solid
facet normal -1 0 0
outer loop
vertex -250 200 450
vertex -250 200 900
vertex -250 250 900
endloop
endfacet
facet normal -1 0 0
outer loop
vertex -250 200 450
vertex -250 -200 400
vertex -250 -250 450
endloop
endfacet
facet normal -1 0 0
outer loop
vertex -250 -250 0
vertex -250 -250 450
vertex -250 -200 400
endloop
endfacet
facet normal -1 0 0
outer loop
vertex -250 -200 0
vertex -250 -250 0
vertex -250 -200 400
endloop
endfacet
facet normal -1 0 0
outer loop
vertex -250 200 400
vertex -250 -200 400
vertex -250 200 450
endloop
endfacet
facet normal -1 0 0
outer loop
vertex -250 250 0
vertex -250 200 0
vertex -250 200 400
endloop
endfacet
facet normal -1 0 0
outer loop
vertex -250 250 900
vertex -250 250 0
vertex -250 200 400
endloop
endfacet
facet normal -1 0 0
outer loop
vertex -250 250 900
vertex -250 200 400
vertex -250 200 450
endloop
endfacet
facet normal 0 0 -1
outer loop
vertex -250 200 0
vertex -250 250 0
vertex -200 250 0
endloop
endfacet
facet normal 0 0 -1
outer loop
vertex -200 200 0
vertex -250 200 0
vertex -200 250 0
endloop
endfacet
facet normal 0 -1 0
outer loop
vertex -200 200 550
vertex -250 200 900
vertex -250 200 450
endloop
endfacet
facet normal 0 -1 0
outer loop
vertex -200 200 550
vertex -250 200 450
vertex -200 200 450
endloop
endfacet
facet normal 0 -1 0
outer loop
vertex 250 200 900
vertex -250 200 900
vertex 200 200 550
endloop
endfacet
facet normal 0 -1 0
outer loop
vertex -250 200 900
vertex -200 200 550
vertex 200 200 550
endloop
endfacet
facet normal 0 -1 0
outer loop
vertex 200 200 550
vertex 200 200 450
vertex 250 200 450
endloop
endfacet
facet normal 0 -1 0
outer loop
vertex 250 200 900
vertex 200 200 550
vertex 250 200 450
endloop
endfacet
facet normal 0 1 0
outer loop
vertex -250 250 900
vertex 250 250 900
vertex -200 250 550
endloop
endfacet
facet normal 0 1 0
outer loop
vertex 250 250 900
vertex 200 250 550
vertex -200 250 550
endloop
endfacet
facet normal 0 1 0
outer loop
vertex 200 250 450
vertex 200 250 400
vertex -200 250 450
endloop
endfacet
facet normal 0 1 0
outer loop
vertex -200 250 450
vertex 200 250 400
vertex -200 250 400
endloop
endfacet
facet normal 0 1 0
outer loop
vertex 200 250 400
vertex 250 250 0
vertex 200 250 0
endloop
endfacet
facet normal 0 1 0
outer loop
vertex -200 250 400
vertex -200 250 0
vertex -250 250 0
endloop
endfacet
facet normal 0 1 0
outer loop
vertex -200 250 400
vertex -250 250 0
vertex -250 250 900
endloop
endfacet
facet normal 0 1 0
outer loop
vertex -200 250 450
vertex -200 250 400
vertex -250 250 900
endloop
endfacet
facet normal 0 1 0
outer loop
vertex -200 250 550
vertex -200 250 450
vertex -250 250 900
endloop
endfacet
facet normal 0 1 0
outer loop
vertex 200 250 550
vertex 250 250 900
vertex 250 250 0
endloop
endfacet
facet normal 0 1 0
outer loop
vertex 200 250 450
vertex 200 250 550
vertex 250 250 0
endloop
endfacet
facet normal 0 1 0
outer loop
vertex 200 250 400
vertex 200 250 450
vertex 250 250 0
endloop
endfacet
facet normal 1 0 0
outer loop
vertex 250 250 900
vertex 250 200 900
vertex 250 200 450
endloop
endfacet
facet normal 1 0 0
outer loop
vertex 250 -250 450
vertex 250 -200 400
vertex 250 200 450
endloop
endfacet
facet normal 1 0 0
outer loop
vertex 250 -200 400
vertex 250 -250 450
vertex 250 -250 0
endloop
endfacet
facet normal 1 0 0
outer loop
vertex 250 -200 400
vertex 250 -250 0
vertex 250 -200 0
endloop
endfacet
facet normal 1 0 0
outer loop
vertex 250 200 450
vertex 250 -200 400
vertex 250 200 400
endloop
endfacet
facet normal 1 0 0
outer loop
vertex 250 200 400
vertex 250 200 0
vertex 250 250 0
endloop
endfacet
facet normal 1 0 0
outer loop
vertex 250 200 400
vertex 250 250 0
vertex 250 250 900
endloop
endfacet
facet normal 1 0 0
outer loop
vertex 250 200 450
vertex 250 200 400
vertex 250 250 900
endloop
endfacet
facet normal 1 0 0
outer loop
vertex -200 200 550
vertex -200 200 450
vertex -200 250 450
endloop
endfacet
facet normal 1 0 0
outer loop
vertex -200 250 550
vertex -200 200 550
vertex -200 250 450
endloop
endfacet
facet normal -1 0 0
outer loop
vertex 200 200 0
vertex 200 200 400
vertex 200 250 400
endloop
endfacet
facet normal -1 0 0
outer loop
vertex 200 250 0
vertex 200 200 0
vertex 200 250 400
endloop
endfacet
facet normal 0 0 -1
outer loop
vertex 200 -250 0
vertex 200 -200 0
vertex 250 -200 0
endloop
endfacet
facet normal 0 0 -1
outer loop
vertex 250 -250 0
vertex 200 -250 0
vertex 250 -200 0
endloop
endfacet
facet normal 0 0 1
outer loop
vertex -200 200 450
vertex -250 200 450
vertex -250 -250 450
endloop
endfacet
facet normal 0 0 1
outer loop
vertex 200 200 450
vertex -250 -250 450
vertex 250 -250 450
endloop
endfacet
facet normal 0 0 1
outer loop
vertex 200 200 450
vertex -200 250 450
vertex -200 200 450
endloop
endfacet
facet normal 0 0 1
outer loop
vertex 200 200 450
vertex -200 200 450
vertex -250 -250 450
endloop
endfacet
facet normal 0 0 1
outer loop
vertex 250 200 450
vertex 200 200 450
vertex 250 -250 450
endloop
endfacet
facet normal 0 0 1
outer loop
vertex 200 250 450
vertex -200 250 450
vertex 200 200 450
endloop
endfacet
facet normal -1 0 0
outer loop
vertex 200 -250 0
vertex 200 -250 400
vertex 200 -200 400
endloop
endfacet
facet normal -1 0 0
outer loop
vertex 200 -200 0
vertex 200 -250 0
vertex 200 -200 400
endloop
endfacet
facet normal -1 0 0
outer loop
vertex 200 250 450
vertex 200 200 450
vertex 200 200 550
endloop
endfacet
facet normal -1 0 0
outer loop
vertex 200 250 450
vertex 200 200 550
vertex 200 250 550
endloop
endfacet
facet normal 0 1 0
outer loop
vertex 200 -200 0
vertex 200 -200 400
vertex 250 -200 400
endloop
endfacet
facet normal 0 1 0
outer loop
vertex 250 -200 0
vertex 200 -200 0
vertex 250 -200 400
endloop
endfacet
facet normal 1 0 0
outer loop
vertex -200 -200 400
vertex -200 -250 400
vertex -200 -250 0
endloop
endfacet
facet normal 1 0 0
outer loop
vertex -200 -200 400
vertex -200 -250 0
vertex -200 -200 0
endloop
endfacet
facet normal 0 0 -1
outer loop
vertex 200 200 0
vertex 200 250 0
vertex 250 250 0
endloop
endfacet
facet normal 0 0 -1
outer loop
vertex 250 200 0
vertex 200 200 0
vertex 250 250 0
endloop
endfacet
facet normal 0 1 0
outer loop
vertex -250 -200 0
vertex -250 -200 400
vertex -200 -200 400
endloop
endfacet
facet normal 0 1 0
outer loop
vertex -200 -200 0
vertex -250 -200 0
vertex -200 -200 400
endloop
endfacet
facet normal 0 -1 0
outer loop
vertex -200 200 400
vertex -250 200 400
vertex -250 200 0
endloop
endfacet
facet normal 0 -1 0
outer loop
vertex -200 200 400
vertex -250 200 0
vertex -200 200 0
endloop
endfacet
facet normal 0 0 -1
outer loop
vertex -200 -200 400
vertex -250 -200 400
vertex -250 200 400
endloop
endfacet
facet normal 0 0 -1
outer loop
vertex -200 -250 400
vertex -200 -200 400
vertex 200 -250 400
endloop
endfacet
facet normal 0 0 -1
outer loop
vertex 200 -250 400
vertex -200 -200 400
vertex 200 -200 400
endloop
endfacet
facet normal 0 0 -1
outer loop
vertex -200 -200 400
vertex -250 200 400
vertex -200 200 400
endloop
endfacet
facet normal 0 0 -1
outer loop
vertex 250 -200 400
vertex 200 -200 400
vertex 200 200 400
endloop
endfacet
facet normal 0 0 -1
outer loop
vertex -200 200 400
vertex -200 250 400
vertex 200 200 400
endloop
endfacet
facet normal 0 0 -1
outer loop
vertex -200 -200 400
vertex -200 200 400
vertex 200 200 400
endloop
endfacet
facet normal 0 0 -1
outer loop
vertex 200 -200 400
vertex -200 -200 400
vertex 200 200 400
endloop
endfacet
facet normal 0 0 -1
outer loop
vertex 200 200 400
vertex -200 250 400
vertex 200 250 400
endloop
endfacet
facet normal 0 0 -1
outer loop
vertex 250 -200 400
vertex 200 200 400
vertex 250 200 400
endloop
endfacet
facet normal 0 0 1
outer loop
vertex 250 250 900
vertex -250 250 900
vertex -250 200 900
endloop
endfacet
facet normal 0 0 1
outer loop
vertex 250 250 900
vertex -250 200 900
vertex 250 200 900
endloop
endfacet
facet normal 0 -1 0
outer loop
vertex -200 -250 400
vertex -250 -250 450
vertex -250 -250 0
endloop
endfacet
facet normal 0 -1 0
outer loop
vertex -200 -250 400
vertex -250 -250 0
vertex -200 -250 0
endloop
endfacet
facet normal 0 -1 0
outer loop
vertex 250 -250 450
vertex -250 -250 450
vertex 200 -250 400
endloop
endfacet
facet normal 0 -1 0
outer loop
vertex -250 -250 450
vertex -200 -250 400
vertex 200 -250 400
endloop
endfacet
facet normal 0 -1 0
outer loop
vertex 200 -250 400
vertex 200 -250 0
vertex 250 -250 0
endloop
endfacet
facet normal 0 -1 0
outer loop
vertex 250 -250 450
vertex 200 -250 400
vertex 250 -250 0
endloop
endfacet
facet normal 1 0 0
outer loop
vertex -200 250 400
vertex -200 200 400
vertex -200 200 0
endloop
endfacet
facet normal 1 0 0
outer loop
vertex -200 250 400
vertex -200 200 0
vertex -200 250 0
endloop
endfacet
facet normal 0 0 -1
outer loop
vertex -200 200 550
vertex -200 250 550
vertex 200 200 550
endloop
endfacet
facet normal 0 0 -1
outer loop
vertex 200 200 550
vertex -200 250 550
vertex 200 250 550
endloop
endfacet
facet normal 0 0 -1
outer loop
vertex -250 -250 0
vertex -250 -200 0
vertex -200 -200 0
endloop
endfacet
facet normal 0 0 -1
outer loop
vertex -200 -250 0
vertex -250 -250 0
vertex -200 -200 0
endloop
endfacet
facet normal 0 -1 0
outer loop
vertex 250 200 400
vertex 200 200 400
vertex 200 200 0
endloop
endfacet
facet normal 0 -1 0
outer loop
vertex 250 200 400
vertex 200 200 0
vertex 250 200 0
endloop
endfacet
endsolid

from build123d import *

# Parameters (mm, degrees)
F0_W     = 50
F0_H     = 50
F1_DEPTH = 400
F2_START = 400
F0_H_2   = 400
F0_W_2   = 400
F2_DEPTH = 50
F3_START = 450
F3_DEPTH = 100
F4_START = 550
F4_DEPTH = 350


with BuildPart() as f1:
    # F0 (on Top) → F1 (new body)
    with BuildSketch(Plane.XY):
        with Locations((225, 225)):
            Rectangle(F0_W, F0_H)
    extrude(amount=F1_DEPTH)



with BuildPart() as f1b:
    # F0 (on Top) → F1, piece 2 (new body)
    with BuildSketch(Plane.XY):
        with Locations((-225, 225)):
            Rectangle(F0_W, F0_H)
    extrude(amount=F1_DEPTH)


with BuildPart() as f1c:
    # F0 (on Top) → F1, piece 3 (new body)
    with BuildSketch(Plane.XY):
        with Locations((-225, -225)):
            Rectangle(F0_W, F0_H)
    extrude(amount=F1_DEPTH)


with BuildPart() as f1d:
    # F0 (on Top) → F1, piece 4 (new body)
    with BuildSketch(Plane.XY):
        with Locations((225, -225)):
            Rectangle(F0_W, F0_H)
    extrude(amount=F1_DEPTH)


with BuildPart() as f1_1:
    add(f1.part)

    add(f1b.part)  # F2 merges F1b

    add(f1c.part)  # F2 merges F1c

    add(f1d.part)  # F2 merges F1d
    # F0 (on Top) → F2 (join)
    with BuildSketch(Plane.XY.offset(F2_START)):
        with Locations((-225, 0)):
            Rectangle(F0_W, F0_H_2)
        Rectangle(F0_W_2, F0_H_2)
        with Locations((0, 225)):
            Rectangle(F0_W_2, F0_H)
        with Locations((225, 0)):
            Rectangle(F0_W, F0_H_2)
        with Locations((0, -225)):
            Rectangle(F0_W_2, F0_H)
        with Locations((-225, -225)):
            Rectangle(F0_W, F0_H)
        with Locations((-225, 225)):
            Rectangle(F0_W, F0_H)
        with Locations((225, 225)):
            Rectangle(F0_W, F0_H)
        with Locations((225, -225)):
            Rectangle(F0_W, F0_H)
    extrude(amount=F2_DEPTH)

    # F0 (on Top) → F3 (join)
    with BuildSketch(Plane.XY.offset(F3_START)):
        with Locations((225, 225)):
            Rectangle(F0_W, F0_H)
        with Locations((-225, 225)):
            Rectangle(F0_W, F0_H)
    extrude(amount=F3_DEPTH)

    # F0 (on Top) → F4 (join)
    with BuildSketch(Plane.XY.offset(F4_START)):
        with Locations((0, 225)):
            Rectangle(F0_W_2, F0_H)
        with Locations((225, 225)):
            Rectangle(F0_W, F0_H)
        with Locations((-225, 225)):
            Rectangle(F0_W, F0_H)
    extrude(amount=F4_DEPTH)


solid = f1_1.part
